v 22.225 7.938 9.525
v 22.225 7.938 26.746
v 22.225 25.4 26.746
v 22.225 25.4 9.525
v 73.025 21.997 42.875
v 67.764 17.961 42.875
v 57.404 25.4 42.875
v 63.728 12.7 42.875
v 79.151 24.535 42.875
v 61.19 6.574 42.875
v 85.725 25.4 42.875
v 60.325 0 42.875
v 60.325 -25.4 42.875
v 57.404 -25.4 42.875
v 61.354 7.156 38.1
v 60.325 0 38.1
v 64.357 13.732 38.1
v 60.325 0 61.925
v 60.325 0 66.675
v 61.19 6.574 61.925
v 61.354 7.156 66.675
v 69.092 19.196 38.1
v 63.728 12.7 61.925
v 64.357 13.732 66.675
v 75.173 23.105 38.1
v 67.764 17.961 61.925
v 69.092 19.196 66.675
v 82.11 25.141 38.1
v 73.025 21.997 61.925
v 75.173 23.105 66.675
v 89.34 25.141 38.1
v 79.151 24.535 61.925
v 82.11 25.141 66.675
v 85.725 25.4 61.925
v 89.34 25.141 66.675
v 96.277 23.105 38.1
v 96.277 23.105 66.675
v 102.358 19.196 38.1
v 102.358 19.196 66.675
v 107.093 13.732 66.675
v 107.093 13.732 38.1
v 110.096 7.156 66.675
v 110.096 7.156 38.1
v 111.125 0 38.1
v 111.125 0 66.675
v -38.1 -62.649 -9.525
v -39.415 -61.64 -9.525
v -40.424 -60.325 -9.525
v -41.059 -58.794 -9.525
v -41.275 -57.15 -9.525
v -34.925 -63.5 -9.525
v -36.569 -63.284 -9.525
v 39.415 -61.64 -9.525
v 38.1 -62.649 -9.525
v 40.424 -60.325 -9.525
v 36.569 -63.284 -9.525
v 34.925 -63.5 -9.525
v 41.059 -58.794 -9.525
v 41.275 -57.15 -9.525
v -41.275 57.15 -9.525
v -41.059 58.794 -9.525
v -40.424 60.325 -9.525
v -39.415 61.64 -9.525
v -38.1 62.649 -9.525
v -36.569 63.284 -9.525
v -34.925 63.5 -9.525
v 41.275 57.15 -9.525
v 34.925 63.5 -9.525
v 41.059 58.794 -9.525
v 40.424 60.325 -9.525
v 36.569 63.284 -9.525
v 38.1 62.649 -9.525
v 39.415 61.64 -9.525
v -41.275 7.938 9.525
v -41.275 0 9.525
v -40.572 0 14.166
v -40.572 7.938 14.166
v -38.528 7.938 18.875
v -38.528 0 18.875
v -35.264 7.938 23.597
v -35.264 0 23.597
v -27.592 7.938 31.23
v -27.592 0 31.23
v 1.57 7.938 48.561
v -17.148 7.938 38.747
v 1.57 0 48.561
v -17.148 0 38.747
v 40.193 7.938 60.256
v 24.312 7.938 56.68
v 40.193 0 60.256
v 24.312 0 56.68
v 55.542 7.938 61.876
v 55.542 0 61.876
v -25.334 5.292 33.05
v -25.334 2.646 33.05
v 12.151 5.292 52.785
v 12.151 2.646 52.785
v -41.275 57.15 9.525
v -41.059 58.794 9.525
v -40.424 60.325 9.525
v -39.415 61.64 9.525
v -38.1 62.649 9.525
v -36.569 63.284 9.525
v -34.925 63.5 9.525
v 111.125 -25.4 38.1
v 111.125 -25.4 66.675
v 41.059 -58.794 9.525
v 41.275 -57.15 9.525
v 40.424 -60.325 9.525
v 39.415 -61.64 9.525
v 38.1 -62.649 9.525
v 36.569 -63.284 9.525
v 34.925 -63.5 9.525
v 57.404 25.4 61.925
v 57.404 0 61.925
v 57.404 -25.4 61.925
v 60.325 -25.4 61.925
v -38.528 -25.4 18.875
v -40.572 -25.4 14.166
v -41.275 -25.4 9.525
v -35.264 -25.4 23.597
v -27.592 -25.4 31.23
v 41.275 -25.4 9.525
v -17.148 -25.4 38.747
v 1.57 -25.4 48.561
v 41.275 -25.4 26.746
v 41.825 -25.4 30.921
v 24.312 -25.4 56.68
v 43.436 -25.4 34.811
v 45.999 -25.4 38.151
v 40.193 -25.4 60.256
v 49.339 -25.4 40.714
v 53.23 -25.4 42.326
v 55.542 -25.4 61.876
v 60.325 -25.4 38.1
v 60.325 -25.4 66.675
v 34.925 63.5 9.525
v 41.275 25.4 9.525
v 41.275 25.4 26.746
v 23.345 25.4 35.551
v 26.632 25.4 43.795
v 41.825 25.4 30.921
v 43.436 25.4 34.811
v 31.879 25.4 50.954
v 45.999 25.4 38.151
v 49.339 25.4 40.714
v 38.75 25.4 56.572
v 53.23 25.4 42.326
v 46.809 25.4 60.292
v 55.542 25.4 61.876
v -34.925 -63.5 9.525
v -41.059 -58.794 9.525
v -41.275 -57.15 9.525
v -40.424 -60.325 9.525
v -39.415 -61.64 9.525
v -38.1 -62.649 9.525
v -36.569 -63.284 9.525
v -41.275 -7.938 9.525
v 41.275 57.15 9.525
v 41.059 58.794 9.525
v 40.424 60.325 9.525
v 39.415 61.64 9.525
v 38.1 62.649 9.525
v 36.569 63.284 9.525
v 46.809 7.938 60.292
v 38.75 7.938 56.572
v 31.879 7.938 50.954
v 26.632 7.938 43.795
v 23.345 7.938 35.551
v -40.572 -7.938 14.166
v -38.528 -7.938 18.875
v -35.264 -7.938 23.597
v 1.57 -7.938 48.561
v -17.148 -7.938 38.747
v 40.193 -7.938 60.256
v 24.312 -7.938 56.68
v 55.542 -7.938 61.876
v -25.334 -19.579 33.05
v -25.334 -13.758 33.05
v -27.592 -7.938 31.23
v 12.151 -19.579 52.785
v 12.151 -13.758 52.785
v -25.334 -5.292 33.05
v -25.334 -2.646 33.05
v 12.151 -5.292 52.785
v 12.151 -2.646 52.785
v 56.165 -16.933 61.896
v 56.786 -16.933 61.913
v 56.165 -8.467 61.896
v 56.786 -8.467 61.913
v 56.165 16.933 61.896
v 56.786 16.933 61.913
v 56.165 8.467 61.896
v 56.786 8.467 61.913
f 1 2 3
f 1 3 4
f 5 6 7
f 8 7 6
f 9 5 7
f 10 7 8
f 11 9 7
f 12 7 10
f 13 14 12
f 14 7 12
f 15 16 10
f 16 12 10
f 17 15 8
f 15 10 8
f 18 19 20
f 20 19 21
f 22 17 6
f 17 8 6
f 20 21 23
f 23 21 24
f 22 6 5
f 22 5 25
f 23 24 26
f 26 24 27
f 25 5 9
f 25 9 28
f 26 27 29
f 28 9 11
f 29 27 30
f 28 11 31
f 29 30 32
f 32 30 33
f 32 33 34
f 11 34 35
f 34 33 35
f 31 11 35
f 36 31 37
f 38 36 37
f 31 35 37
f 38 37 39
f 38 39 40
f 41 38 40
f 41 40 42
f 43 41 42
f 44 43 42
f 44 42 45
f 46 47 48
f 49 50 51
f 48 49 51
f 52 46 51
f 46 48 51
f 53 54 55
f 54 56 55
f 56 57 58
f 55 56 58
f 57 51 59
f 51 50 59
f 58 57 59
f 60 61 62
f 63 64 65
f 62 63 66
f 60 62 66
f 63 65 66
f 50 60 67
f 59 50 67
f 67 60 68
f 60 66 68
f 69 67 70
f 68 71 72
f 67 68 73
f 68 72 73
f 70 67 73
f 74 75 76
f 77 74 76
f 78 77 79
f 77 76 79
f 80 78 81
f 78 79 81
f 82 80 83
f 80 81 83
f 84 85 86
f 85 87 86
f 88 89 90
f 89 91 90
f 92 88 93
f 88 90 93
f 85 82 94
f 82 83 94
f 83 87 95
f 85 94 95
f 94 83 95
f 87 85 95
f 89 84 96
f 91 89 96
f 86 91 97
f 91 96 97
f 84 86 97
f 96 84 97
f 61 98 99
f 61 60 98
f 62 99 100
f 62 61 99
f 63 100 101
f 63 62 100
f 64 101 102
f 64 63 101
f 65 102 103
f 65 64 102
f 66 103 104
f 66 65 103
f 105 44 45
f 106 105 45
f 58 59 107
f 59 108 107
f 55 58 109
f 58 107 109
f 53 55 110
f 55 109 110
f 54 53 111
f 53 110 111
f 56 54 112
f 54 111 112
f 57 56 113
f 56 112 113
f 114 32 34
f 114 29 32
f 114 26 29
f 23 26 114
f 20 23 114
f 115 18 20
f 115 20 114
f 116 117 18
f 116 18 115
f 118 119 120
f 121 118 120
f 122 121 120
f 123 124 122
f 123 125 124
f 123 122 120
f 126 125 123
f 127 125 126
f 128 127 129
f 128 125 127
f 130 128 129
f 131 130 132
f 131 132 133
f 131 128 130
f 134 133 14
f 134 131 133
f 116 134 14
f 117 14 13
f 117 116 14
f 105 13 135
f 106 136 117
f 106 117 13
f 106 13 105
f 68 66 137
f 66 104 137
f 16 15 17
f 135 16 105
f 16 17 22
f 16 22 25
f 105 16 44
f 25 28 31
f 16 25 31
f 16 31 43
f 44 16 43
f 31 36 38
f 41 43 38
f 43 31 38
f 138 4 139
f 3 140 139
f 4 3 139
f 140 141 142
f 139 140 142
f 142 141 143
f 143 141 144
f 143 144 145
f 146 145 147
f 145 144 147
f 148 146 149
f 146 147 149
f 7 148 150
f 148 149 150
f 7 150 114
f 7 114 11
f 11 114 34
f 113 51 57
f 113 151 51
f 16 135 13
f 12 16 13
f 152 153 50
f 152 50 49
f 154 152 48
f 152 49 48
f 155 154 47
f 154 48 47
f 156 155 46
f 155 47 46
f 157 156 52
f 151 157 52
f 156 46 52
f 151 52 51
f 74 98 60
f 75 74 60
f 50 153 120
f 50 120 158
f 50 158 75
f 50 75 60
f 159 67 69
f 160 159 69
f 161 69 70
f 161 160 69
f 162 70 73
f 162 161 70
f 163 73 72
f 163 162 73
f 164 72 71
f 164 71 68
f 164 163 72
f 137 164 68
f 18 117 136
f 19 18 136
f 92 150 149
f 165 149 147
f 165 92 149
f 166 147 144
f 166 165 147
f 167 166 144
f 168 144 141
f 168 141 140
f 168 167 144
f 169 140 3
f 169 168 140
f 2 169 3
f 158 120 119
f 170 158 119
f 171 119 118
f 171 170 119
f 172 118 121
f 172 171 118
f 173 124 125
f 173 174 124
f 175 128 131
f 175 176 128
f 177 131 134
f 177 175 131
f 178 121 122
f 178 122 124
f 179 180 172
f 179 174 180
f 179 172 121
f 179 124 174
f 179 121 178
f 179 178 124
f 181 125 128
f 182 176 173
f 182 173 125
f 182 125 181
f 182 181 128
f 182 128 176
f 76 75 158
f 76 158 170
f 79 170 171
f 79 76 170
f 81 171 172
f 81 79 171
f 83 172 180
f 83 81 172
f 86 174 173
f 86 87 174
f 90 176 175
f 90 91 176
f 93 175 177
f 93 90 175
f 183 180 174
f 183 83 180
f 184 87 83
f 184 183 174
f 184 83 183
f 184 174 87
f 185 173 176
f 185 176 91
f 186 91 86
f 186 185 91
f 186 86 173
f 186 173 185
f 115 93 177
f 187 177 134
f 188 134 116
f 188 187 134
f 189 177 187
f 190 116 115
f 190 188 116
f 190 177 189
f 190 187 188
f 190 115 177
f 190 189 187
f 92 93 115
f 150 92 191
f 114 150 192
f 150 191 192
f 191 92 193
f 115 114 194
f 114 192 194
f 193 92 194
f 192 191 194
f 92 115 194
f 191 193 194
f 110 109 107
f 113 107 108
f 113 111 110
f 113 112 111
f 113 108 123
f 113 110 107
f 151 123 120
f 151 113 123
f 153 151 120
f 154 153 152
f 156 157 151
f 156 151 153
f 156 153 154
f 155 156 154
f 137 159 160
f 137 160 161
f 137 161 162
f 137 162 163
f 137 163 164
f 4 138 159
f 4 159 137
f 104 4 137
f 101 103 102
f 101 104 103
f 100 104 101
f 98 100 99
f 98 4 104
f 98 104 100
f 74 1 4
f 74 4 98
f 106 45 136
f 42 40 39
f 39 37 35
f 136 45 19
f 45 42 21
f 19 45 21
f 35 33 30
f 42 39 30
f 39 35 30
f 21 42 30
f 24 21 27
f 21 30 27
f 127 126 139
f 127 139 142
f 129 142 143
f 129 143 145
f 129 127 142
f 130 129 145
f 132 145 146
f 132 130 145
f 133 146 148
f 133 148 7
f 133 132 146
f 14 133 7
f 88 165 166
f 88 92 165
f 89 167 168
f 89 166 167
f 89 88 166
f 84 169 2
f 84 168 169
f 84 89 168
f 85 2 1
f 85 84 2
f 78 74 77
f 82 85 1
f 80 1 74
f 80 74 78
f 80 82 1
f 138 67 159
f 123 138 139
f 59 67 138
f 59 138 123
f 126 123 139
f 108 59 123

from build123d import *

# Parameters (mm, degrees)
F1_DEPTH = 63.5
F0_W     = 25.4
F0_H     = 19.05
F2_DEPTH = 25.4
F3_DEPTH = 7.9375
F5_R     = 6.35
F0_H_2   = 4.7752
F0_H_3   = 4.7498
F6_DEPTH = 25.4


with BuildPart() as f1:
    # F0 (on Front) → F1 (new body, symmetric)
    with BuildSketch(Plane.XZ):
        Polygon((-41.275, -9.525), (41.275, -9.525), (41.275, 9.525), (22.225, 9.525), (-41.275, 9.525), align=None)
    extrude(amount=F1_DEPTH, both=True)

    # F0 (on Front) → F2 (join, symmetric)
    with BuildSketch(Plane.XZ):
        with BuildLine():
            Line((22.225, 9.525), (41.275, 9.525))
            Line((41.275, 9.525), (41.275, 26.7462))
            ThreePointArc((41.275, 26.7462), (45.9990747262, 38.1511252738), (57.404, 42.8752))
            Line((57.404, 42.8752), (60.325, 42.8752))
            Line((60.325, 42.8752), (60.325, 61.9252))
            Line((60.325, 61.9252), (57.404, 61.9252))
            add(Edge.make_bspline(
                [(55.5422575952, 61.875901909), (56.1662788609, 61.89841175), (56.7869415526, 61.914880349), (57.404, 61.9252)],
                knots=[110.0591294768, 110.0591294768, 110.0591294768, 110.0591294768, 111.7288056011, 111.7288056011, 111.7288056011, 111.7288056011], degree=3))
            ThreePointArc((55.5422575952, 61.875901909), (31.8789507634, 50.9543371128), (22.225, 26.7462))
            Line((22.225, 26.7462), (22.225, 9.525))
        make_face()
        with Locations((73.025, 52.4002)):
            Rectangle(F0_W, F0_H)
    extrude(amount=F2_DEPTH, both=True)

    # F0 (on Front) → F3 (join, symmetric)
    with BuildSketch(Plane.XZ):
        with BuildLine():
            add(Edge.make_bspline(
                [(-41.275, 9.525), (-41.317213665, 32.6592953767), (14.4089885277, 60.3921330151), (55.5422575952, 61.875901909)],
                knots=[0, 0, 0, 0, 110.0591294768, 110.0591294768, 110.0591294768, 110.0591294768], degree=3))
            Line((-41.275, 9.525), (22.225, 9.525))
            Line((22.225, 9.525), (22.225, 26.7462))
            ThreePointArc((22.225, 26.7462), (31.8789507634, 50.9543371128), (55.5422575952, 61.875901909))
        make_face()
    extrude(amount=F3_DEPTH, both=True)

    # F0 (on Front) → F4 (revolve)
    with BuildSketch(Plane.XZ):
        Polygon((85.725, 61.9252), (85.725, 42.8752), (85.725, 38.1), (111.125, 38.1), (111.125, 66.675), (85.725, 66.675), align=None)
    revolve(axis=Axis((85.725, 0, 52.3875), (0, 0, -1)))

    # F5
    f5_edges = [f1.edges().sort_by_distance(p)[0] for p in [
        (-41.275, -63.5, 0),
        (41.275, -63.5, 0),
        (-41.275, 63.5, 0),
        (41.275, 63.5, 0),
    ]]
    fillet(f5_edges, radius=F5_R)

    # F0 (on Front) → F6 (join)
    with BuildSketch(Plane.XZ):
        Polygon((-41.275, -9.525), (41.275, -9.525), (41.275, 9.525), (22.225, 9.525), (-41.275, 9.525), align=None)
        with BuildLine():
            Line((22.225, 9.525), (41.275, 9.525))
            Line((41.275, 9.525), (41.275, 26.7462))
            ThreePointArc((41.275, 26.7462), (45.9990747262, 38.1511252738), (57.404, 42.8752))
            Line((57.404, 42.8752), (60.325, 42.8752))
            Line((60.325, 42.8752), (60.325, 61.9252))
            Line((60.325, 61.9252), (57.404, 61.9252))
            add(Edge.make_bspline(
                [(55.5422575952, 61.875901909), (56.1662788609, 61.89841175), (56.7869415526, 61.914880349), (57.404, 61.9252)],
                knots=[110.0591294768, 110.0591294768, 110.0591294768, 110.0591294768, 111.7288056011, 111.7288056011, 111.7288056011, 111.7288056011], degree=3))
            ThreePointArc((55.5422575952, 61.875901909), (31.8789507634, 50.9543371128), (22.225, 26.7462))
            Line((22.225, 26.7462), (22.225, 9.525))
        make_face()
        with BuildLine():
            add(Edge.make_bspline(
                [(-41.275, 9.525), (-41.317213665, 32.6592953767), (14.4089885277, 60.3921330151), (55.5422575952, 61.875901909)],
                knots=[0, 0, 0, 0, 110.0591294768, 110.0591294768, 110.0591294768, 110.0591294768], degree=3))
            Line((-41.275, 9.525), (22.225, 9.525))
            Line((22.225, 9.525), (22.225, 26.7462))
            ThreePointArc((22.225, 26.7462), (31.8789507634, 50.9543371128), (55.5422575952, 61.875901909))
        make_face()
        with Locations((73.025, 40.4876)):
            Rectangle(F0_W, F0_H_2)
        with Locations((73.025, 52.4002)):
            Rectangle(F0_W, F0_H)
        with Locations((73.025, 64.3001)):
            Rectangle(F0_W, F0_H_3)
        Polygon((85.725, 61.9252), (85.725, 42.8752), (85.725, 38.1), (111.125, 38.1), (111.125, 66.675), (85.725, 66.675), align=None)
    extrude(amount=F6_DEPTH)


solid = f1.part
